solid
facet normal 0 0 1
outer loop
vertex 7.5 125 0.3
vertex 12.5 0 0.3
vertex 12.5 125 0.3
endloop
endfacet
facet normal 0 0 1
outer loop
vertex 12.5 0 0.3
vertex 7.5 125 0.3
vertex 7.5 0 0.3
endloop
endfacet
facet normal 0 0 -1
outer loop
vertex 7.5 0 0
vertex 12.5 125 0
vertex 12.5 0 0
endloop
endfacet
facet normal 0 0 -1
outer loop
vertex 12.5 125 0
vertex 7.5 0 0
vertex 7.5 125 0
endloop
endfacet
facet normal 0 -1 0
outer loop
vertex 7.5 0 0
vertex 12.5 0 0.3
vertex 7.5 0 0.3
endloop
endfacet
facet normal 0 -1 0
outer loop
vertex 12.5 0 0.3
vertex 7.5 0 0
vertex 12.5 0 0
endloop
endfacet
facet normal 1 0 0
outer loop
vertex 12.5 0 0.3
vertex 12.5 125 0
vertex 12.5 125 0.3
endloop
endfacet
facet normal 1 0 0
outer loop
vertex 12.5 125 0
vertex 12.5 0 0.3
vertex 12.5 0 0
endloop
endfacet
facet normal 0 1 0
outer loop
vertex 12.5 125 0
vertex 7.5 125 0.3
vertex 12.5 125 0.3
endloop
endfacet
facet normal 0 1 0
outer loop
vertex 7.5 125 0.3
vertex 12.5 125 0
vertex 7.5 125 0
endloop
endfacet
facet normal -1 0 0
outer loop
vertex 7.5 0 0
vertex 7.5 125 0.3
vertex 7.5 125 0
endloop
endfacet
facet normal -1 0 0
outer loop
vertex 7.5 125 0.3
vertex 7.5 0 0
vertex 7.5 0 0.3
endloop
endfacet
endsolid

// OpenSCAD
/* simple bookmark - CC0 license */

/* parameters */
//body
bookmark_width=5;
bookmark_len=125;
bookmark_thickness=0.3;

//topper
topper_image="topper.png";
topper_scale=[0.03,0.03,0.02];
topper_center=10;

/* code */
translate([0,-topper_center+bookmark_len,0])
union() {
	//overall bookmark body shape
	translate([topper_center-bookmark_width/2,topper_center-bookmark_len,0])
		cube([bookmark_width,bookmark_len,bookmark_thickness]);

	//topper
	scale(topper_scale)
		difference() {
			//topper
			translate([0,0,-2])
				surface(file=topper_image, convexity=5);

			translate([0,0,-10]) cube([1000,1000,10]);
		}
}
